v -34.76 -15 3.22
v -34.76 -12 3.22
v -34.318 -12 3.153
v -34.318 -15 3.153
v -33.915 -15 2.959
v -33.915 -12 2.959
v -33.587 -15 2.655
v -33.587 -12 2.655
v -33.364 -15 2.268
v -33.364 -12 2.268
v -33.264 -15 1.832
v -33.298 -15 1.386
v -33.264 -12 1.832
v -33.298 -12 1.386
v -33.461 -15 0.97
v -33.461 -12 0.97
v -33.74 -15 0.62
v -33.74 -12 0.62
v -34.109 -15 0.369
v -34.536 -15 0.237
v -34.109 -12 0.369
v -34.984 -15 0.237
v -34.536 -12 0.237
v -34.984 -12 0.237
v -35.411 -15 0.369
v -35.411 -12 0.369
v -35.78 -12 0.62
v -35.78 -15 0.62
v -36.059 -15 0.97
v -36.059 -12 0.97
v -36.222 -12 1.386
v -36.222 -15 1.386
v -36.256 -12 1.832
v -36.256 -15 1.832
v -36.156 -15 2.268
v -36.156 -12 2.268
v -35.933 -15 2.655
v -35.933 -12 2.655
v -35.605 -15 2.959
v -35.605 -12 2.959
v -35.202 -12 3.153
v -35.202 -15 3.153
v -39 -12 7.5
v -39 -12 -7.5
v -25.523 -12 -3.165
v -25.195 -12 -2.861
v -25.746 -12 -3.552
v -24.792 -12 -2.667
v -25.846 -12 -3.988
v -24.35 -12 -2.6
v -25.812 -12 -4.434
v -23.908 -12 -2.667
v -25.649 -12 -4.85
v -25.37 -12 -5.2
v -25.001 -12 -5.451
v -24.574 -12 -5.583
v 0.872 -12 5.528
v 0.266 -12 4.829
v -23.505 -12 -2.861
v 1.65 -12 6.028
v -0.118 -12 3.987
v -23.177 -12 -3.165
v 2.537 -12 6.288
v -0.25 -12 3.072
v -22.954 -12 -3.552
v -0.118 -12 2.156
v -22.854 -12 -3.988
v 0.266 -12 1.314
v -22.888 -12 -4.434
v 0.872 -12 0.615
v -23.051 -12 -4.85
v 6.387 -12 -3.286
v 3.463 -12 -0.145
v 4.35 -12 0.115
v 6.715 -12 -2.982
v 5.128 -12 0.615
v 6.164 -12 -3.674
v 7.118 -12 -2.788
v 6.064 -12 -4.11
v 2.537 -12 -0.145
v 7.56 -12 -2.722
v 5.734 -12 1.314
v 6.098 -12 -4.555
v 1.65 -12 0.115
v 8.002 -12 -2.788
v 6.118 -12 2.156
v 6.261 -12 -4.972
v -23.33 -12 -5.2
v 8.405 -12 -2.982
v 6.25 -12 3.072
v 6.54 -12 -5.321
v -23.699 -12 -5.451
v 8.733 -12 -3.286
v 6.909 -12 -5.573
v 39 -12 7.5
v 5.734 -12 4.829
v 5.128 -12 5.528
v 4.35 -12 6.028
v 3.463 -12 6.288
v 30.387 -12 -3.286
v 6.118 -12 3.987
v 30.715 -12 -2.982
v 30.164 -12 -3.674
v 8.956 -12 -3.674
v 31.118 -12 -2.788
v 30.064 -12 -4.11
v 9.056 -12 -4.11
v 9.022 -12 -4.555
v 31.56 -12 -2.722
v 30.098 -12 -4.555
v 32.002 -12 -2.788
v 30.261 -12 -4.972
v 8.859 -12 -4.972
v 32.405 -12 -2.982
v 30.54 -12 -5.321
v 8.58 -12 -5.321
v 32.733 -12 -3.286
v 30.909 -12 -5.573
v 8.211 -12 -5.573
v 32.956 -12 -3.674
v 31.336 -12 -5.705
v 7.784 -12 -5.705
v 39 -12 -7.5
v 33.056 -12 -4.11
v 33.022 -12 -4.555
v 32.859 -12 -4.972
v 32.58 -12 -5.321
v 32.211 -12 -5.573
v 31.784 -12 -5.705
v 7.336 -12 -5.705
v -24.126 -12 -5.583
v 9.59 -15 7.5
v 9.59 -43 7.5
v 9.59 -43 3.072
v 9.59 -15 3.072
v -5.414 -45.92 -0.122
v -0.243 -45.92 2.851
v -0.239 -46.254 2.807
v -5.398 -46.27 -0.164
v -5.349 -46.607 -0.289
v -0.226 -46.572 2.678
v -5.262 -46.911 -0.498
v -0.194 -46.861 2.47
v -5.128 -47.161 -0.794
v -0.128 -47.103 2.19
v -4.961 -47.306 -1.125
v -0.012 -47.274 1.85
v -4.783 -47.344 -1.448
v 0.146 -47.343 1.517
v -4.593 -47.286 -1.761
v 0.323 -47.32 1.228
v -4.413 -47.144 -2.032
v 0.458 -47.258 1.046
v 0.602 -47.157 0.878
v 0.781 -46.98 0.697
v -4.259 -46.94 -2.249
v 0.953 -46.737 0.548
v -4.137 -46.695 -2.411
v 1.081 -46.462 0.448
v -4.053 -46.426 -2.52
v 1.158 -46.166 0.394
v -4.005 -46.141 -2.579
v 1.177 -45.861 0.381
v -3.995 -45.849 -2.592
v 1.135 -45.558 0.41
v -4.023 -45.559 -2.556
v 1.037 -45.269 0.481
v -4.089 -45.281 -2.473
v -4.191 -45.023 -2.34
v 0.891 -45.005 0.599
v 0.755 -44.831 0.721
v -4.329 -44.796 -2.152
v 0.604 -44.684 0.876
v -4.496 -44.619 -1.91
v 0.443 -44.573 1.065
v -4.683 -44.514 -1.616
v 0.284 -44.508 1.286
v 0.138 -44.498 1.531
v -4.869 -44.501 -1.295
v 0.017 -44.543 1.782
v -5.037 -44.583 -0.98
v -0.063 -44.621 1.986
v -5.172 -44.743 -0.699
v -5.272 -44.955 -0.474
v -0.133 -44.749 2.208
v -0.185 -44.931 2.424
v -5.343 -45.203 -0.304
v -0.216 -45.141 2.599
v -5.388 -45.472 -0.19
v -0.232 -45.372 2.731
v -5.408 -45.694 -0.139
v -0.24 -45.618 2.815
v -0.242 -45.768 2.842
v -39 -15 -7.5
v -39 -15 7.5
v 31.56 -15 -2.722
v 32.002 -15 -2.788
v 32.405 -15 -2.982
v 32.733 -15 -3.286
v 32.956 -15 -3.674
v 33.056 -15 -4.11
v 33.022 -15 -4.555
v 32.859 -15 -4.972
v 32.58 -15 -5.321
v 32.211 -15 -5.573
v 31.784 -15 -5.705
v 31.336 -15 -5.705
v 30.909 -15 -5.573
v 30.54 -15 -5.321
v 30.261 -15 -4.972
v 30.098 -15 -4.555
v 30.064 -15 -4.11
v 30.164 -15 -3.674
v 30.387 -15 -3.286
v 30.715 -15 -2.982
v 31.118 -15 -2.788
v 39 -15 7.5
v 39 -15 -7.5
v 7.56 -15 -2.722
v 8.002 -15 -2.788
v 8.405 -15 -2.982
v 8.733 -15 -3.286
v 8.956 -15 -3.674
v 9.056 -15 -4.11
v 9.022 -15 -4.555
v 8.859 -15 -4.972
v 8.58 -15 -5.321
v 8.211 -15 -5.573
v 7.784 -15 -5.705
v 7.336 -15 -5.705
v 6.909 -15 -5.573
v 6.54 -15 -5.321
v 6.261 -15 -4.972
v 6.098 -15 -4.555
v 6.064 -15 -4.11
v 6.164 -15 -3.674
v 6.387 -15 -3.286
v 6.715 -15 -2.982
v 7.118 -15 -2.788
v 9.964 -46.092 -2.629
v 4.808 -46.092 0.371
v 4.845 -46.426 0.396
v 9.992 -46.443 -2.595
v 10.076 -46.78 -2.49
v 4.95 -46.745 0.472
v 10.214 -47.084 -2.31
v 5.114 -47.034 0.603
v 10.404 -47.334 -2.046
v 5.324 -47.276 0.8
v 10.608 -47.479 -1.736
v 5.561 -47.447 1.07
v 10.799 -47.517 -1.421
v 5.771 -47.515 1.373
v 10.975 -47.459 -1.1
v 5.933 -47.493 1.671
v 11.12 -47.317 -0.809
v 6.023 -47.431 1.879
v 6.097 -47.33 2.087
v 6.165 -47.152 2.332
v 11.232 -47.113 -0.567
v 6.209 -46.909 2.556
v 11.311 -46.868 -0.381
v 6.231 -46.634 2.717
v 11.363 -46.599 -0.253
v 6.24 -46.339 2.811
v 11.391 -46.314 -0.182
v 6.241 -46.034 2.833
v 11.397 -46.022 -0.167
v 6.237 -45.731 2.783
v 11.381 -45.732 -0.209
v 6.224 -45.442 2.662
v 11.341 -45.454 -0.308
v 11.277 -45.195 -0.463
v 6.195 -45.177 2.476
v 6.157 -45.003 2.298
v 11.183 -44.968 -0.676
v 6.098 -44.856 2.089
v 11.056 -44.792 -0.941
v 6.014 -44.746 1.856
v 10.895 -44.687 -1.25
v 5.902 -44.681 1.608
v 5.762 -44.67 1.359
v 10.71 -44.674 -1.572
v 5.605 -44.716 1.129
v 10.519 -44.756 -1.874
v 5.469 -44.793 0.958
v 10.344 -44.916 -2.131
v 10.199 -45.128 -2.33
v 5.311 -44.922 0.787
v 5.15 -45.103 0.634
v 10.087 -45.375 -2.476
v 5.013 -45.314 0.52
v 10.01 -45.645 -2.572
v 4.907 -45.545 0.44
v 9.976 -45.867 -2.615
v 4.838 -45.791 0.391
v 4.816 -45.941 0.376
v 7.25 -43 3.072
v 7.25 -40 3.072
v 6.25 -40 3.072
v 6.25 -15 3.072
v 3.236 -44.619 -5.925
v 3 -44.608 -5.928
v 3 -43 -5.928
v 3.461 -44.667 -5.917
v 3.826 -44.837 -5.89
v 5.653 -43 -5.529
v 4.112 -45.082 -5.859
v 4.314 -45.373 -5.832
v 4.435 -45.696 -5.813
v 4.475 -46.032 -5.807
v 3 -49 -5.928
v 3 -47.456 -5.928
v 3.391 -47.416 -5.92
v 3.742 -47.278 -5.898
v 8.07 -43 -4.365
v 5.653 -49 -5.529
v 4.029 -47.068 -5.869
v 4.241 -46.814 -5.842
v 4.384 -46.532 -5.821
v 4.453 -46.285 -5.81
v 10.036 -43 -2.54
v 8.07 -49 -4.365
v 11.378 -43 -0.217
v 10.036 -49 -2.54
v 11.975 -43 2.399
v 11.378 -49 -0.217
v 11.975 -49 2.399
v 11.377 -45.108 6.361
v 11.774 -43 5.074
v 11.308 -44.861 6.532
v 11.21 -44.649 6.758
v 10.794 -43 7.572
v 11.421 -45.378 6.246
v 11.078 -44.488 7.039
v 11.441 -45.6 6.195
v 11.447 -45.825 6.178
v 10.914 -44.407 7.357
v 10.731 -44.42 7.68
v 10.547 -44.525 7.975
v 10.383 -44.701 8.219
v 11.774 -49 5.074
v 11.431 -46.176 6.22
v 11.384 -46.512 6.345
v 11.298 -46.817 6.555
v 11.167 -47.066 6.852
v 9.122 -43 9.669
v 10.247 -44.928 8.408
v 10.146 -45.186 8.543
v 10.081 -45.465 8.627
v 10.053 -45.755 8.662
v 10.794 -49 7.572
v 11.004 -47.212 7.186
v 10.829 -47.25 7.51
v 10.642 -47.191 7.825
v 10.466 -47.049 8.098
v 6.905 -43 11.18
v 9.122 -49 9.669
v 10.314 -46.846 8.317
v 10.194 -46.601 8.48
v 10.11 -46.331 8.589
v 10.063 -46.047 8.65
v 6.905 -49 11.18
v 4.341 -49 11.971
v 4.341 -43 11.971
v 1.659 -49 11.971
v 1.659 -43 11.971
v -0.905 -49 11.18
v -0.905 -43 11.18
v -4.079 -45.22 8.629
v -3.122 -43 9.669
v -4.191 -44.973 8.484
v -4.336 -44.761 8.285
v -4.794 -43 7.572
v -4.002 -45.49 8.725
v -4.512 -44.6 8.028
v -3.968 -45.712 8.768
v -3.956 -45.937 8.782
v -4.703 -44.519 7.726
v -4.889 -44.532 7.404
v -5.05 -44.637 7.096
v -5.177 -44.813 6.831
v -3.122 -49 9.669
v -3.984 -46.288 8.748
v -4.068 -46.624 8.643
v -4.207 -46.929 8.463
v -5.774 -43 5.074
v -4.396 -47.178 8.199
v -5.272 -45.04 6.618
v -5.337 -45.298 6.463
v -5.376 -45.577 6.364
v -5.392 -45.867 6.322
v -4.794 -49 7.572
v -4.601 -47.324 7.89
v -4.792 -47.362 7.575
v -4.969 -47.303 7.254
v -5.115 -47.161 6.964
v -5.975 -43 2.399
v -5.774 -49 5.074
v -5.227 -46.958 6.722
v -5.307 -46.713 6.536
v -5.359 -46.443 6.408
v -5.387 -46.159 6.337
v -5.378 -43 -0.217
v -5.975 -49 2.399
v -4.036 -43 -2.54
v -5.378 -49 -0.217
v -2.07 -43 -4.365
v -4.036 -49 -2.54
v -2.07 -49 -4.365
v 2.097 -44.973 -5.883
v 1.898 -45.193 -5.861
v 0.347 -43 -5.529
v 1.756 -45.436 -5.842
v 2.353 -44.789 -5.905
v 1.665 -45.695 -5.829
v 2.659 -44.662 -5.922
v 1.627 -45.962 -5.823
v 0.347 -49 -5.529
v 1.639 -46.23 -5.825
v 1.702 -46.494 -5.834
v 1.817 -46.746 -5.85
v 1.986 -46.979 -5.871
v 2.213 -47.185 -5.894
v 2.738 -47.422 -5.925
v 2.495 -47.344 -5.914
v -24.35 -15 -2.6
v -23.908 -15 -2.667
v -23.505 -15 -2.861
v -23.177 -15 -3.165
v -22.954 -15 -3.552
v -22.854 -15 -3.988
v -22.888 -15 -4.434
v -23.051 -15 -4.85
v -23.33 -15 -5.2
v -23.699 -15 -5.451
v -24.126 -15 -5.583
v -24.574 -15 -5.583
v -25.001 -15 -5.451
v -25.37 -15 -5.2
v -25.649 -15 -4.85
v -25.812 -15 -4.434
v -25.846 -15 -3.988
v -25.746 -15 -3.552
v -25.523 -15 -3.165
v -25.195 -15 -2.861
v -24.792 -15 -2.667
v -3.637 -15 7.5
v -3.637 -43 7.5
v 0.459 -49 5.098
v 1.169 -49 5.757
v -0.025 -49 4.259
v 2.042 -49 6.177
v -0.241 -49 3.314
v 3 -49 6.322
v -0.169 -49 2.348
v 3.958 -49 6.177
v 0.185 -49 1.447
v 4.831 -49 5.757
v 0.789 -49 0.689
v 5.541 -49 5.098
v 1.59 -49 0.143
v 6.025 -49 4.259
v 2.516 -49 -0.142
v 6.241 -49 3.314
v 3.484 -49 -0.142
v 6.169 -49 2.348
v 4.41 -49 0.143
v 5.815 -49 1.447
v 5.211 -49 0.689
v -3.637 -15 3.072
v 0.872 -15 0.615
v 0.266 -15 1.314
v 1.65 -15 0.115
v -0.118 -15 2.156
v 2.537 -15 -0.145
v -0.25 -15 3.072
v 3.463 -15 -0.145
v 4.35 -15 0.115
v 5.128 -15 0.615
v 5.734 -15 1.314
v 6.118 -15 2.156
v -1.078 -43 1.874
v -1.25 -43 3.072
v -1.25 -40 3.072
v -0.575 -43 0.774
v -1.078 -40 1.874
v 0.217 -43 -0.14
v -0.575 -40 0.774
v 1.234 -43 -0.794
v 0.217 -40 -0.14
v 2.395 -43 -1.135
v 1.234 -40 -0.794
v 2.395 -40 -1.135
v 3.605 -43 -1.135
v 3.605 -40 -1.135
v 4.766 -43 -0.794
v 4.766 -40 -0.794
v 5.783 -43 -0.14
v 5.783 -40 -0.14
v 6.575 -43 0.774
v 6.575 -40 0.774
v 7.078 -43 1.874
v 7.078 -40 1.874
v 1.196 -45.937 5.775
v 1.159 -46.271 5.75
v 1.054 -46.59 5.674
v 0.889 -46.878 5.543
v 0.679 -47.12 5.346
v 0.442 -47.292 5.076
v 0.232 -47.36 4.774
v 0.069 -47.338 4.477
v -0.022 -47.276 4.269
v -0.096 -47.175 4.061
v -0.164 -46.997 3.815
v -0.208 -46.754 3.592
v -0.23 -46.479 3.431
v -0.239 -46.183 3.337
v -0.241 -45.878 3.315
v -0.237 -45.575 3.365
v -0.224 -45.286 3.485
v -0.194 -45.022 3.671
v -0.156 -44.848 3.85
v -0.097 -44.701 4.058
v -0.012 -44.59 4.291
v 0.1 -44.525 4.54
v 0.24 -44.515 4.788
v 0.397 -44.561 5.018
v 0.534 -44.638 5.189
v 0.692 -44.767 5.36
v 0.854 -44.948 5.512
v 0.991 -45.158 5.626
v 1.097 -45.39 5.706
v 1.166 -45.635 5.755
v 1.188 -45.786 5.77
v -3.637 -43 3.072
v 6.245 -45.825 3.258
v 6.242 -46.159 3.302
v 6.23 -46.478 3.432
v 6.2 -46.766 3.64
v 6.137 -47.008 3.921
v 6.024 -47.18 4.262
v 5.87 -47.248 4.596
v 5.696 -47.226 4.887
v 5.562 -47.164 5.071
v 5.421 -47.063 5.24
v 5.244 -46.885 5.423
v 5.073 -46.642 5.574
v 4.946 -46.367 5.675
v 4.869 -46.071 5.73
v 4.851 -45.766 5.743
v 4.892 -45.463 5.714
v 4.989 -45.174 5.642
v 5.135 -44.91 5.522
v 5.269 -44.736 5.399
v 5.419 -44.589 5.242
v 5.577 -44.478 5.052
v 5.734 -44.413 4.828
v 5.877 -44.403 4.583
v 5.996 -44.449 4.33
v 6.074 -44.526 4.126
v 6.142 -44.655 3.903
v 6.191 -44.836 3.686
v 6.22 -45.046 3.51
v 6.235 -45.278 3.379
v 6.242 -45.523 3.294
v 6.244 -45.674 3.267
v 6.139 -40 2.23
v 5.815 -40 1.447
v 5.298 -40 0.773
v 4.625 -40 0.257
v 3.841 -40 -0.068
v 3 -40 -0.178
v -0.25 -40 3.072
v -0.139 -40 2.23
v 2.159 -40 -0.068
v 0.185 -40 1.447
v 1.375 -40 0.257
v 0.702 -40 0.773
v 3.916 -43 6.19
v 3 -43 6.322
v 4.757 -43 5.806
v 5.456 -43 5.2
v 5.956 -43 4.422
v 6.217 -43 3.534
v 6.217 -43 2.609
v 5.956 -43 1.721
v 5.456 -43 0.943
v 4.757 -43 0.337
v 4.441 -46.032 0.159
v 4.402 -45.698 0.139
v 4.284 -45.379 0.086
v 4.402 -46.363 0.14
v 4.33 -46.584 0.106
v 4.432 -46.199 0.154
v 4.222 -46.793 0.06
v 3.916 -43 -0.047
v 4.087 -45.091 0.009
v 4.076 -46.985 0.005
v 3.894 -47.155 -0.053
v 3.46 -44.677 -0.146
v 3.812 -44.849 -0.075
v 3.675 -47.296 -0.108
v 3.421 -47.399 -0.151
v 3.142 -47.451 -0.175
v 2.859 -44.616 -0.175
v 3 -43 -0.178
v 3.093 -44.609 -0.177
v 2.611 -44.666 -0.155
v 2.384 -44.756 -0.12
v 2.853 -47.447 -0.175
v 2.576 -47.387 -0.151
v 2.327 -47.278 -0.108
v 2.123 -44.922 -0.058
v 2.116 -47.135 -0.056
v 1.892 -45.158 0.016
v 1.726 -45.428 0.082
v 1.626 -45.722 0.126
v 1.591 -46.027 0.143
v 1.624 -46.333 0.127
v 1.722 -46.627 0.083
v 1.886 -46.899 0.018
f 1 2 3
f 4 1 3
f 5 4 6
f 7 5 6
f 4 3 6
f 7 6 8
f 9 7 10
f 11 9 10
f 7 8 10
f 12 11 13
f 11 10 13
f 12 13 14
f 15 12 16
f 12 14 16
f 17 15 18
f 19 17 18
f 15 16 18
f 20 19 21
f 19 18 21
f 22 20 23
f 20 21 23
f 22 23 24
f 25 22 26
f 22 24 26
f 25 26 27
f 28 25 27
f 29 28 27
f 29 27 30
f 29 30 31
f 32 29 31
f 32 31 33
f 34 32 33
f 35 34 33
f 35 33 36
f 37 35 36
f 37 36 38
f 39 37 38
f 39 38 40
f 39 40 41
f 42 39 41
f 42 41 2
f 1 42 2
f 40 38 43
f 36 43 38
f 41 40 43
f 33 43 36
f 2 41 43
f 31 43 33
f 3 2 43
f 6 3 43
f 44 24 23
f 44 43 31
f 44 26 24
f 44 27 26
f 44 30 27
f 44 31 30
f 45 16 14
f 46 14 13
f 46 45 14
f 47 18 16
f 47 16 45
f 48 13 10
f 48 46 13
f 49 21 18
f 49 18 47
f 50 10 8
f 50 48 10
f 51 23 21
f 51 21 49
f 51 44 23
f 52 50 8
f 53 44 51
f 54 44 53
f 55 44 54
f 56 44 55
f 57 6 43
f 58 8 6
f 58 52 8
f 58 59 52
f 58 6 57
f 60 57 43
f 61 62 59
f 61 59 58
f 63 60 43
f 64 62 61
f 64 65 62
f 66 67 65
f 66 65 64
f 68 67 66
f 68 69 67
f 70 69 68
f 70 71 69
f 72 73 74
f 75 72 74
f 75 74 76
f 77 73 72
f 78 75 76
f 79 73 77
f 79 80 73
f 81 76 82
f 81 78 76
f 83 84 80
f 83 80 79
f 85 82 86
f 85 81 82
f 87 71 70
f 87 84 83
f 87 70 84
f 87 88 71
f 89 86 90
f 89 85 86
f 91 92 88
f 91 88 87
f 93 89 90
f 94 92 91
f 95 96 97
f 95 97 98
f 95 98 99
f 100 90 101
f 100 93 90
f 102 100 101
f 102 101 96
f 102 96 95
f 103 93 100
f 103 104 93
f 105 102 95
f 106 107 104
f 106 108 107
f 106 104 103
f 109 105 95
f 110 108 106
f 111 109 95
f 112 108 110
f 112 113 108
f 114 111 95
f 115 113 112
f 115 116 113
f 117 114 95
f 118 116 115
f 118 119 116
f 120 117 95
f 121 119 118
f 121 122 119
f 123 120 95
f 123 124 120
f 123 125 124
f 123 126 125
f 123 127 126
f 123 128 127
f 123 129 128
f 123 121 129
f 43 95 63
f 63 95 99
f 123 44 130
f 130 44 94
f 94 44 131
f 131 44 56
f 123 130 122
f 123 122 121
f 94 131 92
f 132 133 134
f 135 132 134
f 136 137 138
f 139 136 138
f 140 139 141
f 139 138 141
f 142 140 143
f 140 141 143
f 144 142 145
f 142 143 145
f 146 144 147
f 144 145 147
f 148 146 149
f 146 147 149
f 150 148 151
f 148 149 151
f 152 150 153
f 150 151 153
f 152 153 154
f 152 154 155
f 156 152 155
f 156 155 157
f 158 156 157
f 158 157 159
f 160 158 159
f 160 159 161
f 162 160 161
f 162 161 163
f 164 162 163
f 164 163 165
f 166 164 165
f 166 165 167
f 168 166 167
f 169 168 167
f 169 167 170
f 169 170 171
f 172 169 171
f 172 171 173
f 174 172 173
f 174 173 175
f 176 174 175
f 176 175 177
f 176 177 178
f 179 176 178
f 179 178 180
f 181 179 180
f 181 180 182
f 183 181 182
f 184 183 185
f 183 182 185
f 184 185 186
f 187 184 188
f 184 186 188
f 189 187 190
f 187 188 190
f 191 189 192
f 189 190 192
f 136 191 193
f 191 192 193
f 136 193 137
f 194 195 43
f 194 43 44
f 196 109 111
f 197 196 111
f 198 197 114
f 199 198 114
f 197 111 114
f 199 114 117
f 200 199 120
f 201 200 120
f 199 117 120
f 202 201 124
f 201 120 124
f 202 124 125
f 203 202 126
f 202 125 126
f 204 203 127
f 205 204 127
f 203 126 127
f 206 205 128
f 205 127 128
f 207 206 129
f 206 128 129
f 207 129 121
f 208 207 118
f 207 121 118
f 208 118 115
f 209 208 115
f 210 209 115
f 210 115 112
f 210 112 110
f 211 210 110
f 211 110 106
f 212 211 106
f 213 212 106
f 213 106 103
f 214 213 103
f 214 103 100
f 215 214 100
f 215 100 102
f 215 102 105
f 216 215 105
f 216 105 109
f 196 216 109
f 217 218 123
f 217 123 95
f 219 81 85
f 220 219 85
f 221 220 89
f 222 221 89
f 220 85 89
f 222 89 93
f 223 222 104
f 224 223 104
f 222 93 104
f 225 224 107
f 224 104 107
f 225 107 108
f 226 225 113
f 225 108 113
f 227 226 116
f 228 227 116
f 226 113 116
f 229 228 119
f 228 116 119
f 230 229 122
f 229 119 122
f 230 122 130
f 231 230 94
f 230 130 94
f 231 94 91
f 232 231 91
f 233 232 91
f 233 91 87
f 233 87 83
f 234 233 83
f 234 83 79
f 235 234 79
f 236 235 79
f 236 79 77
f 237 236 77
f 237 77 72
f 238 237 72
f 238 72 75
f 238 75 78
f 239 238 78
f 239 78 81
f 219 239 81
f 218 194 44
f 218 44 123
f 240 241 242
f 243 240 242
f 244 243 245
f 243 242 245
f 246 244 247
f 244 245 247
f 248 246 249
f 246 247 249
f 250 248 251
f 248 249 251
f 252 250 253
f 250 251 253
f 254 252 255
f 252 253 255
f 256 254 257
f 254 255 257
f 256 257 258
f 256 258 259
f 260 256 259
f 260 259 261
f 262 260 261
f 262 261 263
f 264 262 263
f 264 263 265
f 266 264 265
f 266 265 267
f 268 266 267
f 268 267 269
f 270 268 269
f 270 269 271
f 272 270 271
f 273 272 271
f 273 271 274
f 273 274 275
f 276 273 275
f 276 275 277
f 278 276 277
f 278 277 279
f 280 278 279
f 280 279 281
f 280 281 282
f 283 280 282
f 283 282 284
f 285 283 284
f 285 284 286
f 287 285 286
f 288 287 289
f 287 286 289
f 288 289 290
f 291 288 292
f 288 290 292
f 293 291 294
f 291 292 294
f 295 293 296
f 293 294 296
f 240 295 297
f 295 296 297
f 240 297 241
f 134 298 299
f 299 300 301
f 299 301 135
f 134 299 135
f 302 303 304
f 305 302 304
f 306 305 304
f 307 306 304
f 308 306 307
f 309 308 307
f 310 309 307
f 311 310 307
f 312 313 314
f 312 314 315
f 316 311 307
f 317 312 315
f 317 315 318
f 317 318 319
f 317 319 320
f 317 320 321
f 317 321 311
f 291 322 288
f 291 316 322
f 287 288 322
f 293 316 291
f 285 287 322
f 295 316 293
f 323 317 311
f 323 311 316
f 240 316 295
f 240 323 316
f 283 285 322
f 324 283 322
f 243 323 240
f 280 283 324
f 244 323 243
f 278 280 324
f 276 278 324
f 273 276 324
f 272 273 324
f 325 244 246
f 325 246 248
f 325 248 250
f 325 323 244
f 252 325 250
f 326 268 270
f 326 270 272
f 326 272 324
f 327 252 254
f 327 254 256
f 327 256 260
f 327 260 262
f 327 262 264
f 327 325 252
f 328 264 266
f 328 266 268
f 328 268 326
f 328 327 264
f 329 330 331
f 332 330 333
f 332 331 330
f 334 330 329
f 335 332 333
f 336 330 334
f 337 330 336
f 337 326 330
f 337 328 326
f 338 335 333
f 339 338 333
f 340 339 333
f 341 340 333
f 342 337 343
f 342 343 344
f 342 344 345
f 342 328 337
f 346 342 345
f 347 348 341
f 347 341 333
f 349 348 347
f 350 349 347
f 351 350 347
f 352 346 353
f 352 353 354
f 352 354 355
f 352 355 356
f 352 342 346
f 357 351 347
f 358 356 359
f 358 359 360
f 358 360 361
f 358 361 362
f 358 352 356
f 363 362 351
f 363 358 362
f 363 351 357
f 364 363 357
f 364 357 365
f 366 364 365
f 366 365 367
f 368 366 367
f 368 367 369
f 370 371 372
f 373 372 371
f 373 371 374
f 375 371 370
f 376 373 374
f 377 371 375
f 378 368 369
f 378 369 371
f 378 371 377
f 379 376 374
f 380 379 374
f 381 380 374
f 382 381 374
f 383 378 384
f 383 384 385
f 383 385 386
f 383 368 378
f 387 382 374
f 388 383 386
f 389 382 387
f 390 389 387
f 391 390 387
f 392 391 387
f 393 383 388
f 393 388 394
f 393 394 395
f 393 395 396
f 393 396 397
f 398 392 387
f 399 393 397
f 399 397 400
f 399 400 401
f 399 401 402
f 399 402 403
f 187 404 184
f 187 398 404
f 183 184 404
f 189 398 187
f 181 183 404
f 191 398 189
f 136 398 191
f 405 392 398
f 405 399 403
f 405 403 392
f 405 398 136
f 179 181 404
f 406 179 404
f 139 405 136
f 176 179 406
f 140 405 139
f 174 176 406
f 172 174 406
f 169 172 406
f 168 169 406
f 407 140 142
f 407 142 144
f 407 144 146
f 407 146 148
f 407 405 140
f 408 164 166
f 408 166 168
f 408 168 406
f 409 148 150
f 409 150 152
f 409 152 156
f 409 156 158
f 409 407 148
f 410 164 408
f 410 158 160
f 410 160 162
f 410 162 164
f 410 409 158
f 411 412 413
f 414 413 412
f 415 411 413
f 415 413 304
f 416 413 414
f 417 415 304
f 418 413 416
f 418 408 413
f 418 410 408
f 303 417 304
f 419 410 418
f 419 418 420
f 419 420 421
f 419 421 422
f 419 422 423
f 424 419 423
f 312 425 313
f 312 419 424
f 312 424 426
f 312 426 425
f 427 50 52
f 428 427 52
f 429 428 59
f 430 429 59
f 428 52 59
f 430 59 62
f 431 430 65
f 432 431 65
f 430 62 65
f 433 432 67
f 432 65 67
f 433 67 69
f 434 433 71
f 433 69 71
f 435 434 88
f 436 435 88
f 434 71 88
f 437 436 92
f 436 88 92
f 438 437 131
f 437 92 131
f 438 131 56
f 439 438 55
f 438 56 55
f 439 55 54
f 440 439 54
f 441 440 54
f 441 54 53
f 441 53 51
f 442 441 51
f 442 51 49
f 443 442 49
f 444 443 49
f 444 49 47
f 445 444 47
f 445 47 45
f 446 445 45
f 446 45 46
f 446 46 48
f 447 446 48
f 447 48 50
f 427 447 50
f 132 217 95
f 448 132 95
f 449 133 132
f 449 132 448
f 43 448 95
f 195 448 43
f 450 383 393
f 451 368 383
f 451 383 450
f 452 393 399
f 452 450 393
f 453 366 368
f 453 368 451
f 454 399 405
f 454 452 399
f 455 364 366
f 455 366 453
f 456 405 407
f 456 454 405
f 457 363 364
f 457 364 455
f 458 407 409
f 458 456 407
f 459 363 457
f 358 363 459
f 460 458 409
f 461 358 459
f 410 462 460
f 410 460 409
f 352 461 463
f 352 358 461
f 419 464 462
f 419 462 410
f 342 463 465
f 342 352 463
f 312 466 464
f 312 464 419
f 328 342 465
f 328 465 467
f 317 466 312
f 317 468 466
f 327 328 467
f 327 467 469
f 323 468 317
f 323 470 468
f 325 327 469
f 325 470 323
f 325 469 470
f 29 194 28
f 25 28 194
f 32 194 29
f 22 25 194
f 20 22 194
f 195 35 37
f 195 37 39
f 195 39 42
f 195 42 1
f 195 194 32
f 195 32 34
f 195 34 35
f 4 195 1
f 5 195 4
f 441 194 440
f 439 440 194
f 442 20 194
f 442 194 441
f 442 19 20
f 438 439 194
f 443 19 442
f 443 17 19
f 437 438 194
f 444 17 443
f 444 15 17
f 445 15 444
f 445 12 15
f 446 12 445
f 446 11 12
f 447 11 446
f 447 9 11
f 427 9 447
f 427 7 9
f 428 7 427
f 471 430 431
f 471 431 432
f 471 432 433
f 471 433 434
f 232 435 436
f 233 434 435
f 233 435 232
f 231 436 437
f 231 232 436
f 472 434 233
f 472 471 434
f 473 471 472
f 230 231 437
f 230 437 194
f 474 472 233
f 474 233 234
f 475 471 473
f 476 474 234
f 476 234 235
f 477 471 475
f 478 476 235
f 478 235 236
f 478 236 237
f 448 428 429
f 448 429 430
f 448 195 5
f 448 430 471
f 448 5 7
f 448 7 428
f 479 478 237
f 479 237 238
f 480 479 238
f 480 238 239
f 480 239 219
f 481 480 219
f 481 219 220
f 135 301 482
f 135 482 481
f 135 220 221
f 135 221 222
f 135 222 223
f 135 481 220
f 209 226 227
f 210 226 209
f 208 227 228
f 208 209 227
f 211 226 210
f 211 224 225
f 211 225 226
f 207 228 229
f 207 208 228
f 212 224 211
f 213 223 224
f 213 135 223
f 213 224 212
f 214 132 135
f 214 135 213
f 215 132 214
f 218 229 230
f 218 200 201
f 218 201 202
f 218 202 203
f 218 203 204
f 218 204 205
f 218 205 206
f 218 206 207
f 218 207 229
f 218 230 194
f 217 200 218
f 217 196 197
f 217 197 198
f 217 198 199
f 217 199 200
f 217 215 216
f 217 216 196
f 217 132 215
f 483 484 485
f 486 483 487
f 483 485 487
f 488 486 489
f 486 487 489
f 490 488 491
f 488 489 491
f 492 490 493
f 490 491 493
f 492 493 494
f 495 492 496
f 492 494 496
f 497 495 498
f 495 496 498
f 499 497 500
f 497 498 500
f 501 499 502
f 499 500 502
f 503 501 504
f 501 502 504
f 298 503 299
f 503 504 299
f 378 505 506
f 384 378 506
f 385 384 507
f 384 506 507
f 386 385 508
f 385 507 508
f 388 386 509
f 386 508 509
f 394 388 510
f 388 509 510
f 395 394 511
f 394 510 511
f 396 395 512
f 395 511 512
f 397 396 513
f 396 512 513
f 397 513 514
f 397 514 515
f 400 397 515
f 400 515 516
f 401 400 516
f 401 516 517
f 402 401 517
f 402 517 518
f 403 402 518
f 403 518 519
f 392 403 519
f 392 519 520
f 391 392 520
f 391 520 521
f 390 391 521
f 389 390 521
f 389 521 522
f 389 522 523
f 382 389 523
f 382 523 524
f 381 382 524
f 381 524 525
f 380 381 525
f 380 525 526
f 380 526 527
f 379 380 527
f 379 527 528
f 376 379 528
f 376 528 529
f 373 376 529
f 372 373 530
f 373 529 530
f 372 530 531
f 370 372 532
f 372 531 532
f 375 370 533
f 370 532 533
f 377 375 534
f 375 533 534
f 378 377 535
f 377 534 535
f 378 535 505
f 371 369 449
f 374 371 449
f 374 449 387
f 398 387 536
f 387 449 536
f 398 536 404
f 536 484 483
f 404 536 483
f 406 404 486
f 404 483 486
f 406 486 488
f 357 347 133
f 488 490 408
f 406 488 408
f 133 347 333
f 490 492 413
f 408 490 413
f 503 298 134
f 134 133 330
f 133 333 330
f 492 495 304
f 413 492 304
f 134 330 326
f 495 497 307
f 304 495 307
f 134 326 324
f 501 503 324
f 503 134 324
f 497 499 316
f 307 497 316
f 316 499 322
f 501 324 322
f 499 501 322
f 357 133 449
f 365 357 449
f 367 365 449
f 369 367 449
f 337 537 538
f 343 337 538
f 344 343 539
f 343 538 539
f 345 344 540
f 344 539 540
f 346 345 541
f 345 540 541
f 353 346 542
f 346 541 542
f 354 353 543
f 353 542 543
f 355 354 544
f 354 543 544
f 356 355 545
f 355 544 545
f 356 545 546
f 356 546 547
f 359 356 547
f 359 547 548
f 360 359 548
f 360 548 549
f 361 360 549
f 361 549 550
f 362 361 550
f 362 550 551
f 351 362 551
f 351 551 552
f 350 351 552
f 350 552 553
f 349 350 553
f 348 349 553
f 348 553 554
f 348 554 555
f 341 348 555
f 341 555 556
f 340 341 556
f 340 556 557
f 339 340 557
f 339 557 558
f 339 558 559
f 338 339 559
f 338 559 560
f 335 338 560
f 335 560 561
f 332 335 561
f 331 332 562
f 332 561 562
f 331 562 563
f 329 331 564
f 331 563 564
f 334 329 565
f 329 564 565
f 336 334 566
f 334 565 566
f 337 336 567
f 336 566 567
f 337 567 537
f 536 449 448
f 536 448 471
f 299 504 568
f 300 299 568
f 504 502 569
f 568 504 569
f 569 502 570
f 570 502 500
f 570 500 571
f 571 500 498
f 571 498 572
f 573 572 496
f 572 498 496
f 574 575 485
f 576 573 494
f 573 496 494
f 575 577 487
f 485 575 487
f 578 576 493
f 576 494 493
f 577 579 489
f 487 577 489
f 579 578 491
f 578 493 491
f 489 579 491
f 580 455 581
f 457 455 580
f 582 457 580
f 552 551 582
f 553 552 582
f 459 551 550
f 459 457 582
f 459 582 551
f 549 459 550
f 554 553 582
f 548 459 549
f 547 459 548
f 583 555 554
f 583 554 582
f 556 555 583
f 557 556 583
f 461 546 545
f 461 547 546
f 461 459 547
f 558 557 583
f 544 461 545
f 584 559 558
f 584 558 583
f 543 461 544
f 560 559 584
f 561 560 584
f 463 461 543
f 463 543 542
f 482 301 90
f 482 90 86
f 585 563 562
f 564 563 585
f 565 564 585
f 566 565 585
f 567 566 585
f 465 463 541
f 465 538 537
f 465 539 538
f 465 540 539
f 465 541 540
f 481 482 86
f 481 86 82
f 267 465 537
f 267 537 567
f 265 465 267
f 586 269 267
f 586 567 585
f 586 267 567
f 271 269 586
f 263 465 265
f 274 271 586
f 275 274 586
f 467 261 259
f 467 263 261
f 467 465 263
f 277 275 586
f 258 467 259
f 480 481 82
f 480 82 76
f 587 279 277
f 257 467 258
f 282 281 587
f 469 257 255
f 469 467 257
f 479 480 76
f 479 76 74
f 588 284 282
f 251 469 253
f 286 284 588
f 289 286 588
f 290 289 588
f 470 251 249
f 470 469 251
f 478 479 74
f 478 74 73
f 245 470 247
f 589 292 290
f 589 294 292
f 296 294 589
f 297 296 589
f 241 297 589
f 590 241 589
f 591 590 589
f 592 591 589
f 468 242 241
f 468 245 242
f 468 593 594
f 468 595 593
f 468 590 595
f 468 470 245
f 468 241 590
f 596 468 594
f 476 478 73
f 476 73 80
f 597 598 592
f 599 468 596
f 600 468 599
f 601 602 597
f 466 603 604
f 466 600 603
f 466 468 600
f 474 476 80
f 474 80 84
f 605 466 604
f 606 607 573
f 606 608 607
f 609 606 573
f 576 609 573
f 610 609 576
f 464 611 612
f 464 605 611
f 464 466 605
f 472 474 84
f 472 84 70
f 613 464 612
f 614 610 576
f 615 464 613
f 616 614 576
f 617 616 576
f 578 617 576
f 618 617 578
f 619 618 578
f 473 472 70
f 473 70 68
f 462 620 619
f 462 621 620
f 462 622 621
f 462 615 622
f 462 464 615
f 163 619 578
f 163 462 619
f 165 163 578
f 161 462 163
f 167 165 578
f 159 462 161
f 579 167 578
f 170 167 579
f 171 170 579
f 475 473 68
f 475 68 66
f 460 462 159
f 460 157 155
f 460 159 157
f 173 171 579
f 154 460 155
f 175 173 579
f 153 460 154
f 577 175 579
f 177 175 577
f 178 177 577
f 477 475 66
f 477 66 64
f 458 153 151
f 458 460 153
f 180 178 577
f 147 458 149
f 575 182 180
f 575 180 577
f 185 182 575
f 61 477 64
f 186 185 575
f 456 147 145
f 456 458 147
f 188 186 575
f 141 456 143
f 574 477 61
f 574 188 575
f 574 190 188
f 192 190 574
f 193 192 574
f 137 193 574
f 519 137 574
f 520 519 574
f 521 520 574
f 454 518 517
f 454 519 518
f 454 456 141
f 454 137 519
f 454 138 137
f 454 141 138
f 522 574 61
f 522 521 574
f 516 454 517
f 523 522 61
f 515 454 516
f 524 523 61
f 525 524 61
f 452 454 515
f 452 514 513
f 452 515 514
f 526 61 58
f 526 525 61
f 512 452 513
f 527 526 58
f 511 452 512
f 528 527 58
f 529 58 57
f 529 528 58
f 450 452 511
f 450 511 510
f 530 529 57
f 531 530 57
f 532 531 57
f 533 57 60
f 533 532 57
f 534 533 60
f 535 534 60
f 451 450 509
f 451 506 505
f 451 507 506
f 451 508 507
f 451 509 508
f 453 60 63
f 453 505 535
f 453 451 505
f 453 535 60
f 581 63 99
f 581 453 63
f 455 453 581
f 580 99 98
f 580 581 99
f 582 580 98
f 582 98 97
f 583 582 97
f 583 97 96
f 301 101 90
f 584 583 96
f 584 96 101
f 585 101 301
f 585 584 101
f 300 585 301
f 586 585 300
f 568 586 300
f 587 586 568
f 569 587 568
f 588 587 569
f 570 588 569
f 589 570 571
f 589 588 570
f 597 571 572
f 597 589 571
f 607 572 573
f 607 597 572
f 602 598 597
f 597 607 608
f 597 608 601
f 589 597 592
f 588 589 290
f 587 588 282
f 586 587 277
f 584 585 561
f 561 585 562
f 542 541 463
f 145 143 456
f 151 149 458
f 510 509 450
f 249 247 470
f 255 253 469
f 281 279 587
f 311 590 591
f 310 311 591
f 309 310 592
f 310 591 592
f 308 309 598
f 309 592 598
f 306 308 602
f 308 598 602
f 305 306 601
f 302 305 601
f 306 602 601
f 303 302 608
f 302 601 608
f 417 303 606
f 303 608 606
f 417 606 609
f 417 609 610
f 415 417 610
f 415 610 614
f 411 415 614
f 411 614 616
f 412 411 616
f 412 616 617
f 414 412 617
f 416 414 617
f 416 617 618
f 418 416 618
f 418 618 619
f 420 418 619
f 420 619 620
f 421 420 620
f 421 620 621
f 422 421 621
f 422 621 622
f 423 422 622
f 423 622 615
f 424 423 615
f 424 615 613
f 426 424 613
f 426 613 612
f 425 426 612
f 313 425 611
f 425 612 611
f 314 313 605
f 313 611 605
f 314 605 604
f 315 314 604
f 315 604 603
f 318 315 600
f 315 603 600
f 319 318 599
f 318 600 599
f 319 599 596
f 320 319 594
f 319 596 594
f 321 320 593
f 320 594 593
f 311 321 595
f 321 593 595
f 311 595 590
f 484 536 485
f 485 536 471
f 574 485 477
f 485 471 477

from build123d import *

# Parameters (mm, degrees)
SKETCH_1_W                = 78
SKETCH_1_H                = 15
EXTRUDE_1_DEPTH           = 3
SKETCH_3_R                = 1.5
CUT_EXTRUDE_1_DEPTH       = 3
SKETCH_4_R                = 6
EXTRUDE_2_DEPTH           = 18
SKETCH_5_R                = 4.5
CUT_EXTRUDE_2_DEPTH       = 21
F_2_0MM_2_D               = 3
F_2_0MM_2_DEPTH           = 4.5
F_2_0MM_2_TIP             = 1.5
F_2_0MM_2_ON_FACE_2_D     = 3
F_2_0MM_2_ON_FACE_2_DEPTH = 4.5
F_2_0MM_2_ON_FACE_2_TIP   = 1.5
SKETCH_10_W               = 6
SKETCH_10_H               = 10
CUT_EXTRUDE_3_DEPTH       = 7
SKETCH_13_W               = 19.835687411
SKETCH_13_H               = 21.610205193
CUT_EXTRUDE_4_DEPTH       = 20
SKETCH_14_W               = 11.523038103
SKETCH_14_H               = 10.49031299
EXTRUDE_3_DEPTH           = 3
SKETCH_18_W               = 78
SKETCH_18_H               = 8
EXTRUDE_4_DEPTH           = 3
SKETCH_19_W               = 36.767904102
SKETCH_19_H               = 2.5
EXTRUDE_5_DEPTH           = 12.5
SKETCH_23_R               = 1.65
CUT_EXTRUDE_6_DEPTH       = 12.5
SKETCH_25_W               = 4.236607592
SKETCH_25_H               = 5.36409187
EXTRUDE_7_DEPTH           = 2.5
SKETCH_26_R               = 1.6
CUT_EXTRUDE_7_DEPTH       = 2.5
SKETCH_27_W               = 21.346012392
SKETCH_27_H               = 6.594354882
EXTRUDE_8_DEPTH           = 2.5
SKETCH_28_W               = 36.767231154
SKETCH_28_H               = 5.91819544
EXTRUDE_9_DEPTH           = 2.5
SKETCH_29_W               = 27.660340415
SKETCH_29_H               = 3.5
CUT_EXTRUDE_9_DEPTH       = 2.5
SKETCH_30_W               = 78
SKETCH_30_H               = 8
CUT_EXTRUDE_10_DEPTH      = 100
SKETCH_31_W               = 60.820132647
SKETCH_31_H               = 3
EXTRUDE_10_DEPTH          = 49
SKETCH_32_W               = 48
SKETCH_32_H               = 3.2
CUT_EXTRUDE_11_DEPTH      = 49
SKETCH_33_W               = 15
SKETCH_33_H               = 49.05968874
CUT_EXTRUDE_12_DEPTH      = 100
SKETCH_34_R               = 4.25
EXTRUDE_11_DEPTH          = 49
SKETCH_35_R               = 6
EXTRUDE_12_DEPTH          = 6
SKETCH_36_W               = 8.5
SKETCH_36_H               = 40
CUT_EXTRUDE_13_DEPTH      = 11
SKETCH_37_R               = 3.25
CUT_EXTRUDE_16_DEPTH      = 100
SKETCH_39_W               = 8.456699936
SKETCH_39_H               = 16
CUT_EXTRUDE_17_DEPTH      = 1.25
F_3_0MM_1_D               = 2.85
F_3_0MM_1_DEPTH           = 4.143773618
F_3_0MM_1_TIP             = 0.856226382
F_3_0MM_2_D               = 2.85
F_3_0MM_2_DEPTH           = 4.143773618
F_3_0MM_2_TIP             = 0.856226382
F_3_0MM_3_D               = 2.85
F_3_0MM_3_DEPTH           = 4.143773618
F_3_0MM_3_TIP             = 0.856226382
SKETCH_46_W               = 13.227107738
SKETCH_46_H               = 4.428434999
EXTRUDE_13_DEPTH          = 46
CUT_EXTRUDE_18_DEPTH      = 55
EXTRUDE_START             = 15
EXTRUDE_14_DEPTH          = 15
SKETCH_50_R               = 1.5
CUT_EXTRUDE_19_DEPTH      = 15
SKETCH_51_R               = 1.5
CUT_EXTRUDE_20_DEPTH      = 15
SKETCH_52_R               = 1.5
CUT_EXTRUDE_21_DEPTH      = 15
SKETCH_53_R               = 1.5
CUT_EXTRUDE_22_DEPTH      = 15
SKETCH_54_W               = 78
SKETCH_54_H               = 15
CUT_EXTRUDE_23_DEPTH      = 15
F_3_0MM_4_D               = 2.85
F_3_0MM_4_DEPTH           = 4.143773618
F_3_0MM_4_TIP             = 0.856226382
F_3_0MM_5_D               = 2.85
F_3_0MM_5_DEPTH           = 4.143773618
F_3_0MM_5_TIP             = 0.856226382
SKETCH_60_R               = 9
EXTRUDE_15_DEPTH          = 6
CUT_EXTRUDE_START         = -6
SKETCH_61_R               = 3.25
CUT_EXTRUDE_24_DEPTH      = 6
F_3_0MM_6_D               = 2.85
F_3_0MM_6_DEPTH           = 9.143773618
F_3_0MM_6_TIP             = 0.856226382
F_3_0MM_7_D               = 2.85
F_3_0MM_7_DEPTH           = 9.143773618
F_3_0MM_7_TIP             = 0.856226382
F_3_0MM_7_ON_FACE_2_D     = 2.85
F_3_0MM_7_ON_FACE_2_DEPTH = 9.143773618
F_3_0MM_7_ON_FACE_2_TIP   = 0.856226382
F_3_0MM_8_D               = 2.85
F_3_0MM_8_DEPTH           = 9.143773618
F_3_0MM_8_TIP             = 0.856226382
F_3_0MM_8_ON_FACE_2_D     = 2.85
F_3_0MM_8_ON_FACE_2_DEPTH = 9.143773618
F_3_0MM_8_ON_FACE_2_TIP   = 0.856226382


with BuildPart() as part:
    # 草图1 → 凸台-拉伸1 (new body)
    with BuildSketch(Plane(origin=(0, 0, 0), x_dir=(1, 0, 0), z_dir=(0, 1, 0))):
        Rectangle(SKETCH_1_W, SKETCH_1_H)
    extrude(amount=EXTRUDE_1_DEPTH)

    # 草图3 → 切除-拉伸1 (cut)
    with BuildSketch(Plane(origin=(0, 3, 0), x_dir=(1, 0, 0), z_dir=(0, 1, 0))):
        with Locations(Location((-34.76, -1.72, 0), (0, 0, 270))):
            Circle(SKETCH_3_R)
        with Locations(Location((-24.35, 4.1, 0), (0, 0, 270))):
            Circle(SKETCH_3_R)
        with Locations(Location((31.56, 4.221692081, 0), (0, 0, 270))):
            Circle(SKETCH_3_R)
        with Locations(Location((7.56, 4.221692081, 0), (0, 0, 270))):
            Circle(SKETCH_3_R)
    extrude(amount=-CUT_EXTRUDE_1_DEPTH, mode=Mode.SUBTRACT)

    # 草图4 → 凸台-拉伸2 (add)
    with BuildSketch(Plane(origin=(0, 3, 0), x_dir=(1, 0, 0), z_dir=(0, 1, 0))):
        with Locations(Location((-3, -1.234165229, 0), (0, 0, 270))):
            Circle(SKETCH_4_R)
    extrude(amount=EXTRUDE_2_DEPTH)

    # 草图5 → 切除-拉伸2 (cut)
    with BuildSketch(Plane(origin=(0, 21, 0), x_dir=(1, 0, 0), z_dir=(0, 1, 0))):
        with Locations(Location((-3, -1.234165229, 0), (0, 0, 270))):
            Circle(SKETCH_5_R)
    extrude(amount=-CUT_EXTRUDE_2_DEPTH, mode=Mode.SUBTRACT)

    # Ø2.0mm 暗销孔2
    with Locations(Plane(origin=(-7.901331048, 17.342107422, 4.694938836), x_dir=(-0.576795601176, 0, -0.816888507977), z_dir=(-0.816888507977, 0, 0.576795601176))):
        with Locations((0, 0)):
            Hole(F_2_0MM_2_D / 2, depth=F_2_0MM_2_DEPTH)
            with Locations((0, 0, -(F_2_0MM_2_DEPTH + F_2_0MM_2_TIP / 2))):  # 90° drill point
                Cone(0, F_2_0MM_2_D / 2, F_2_0MM_2_TIP, mode=Mode.SUBTRACT)

    # Ø2.0mm 暗销孔2 on face 2
    with Locations(Plane(origin=(1.071764877, 17.164817099, 5.641061052), x_dir=(0.734483043181, 0, -0.678627039897), z_dir=(0.678627039897, 0, 0.734483043181))):
        with Locations((0, 0)):
            Hole(F_2_0MM_2_ON_FACE_2_D / 2, depth=F_2_0MM_2_ON_FACE_2_DEPTH)
            with Locations((0, 0, -(F_2_0MM_2_ON_FACE_2_DEPTH + F_2_0MM_2_ON_FACE_2_TIP / 2))):  # 90° drill point
                Cone(0, F_2_0MM_2_ON_FACE_2_D / 2, F_2_0MM_2_ON_FACE_2_TIP, mode=Mode.SUBTRACT)

    # 草图10 → 切除-拉伸3 (cut)
    with BuildSketch(Plane(origin=(0, 0, -7.5), x_dir=(-1, 0, 0), z_dir=(0, 0, -1))):
        with Locations((3, 8)):
            Rectangle(SKETCH_10_W, SKETCH_10_H)
    extrude(amount=-CUT_EXTRUDE_3_DEPTH, mode=Mode.SUBTRACT)

    # 草图13 → 切除-拉伸4 (cut)
    with BuildSketch(Plane(origin=(0, 0, -7.5), x_dir=(-1, 0, 0), z_dir=(0, 0, -1))):
        with Locations((3.314421038, 13.805102597)):
            Rectangle(SKETCH_13_W, SKETCH_13_H)
    extrude(amount=-CUT_EXTRUDE_4_DEPTH, mode=Mode.SUBTRACT)

    # 草图14 → 凸台-拉伸3 (add)
    with BuildSketch(Plane(origin=(0, 3, 0), x_dir=(1, 0, 0), z_dir=(0, 1, 0))):
        with Locations((-2.989467433, -1.263493391)):
            Rectangle(SKETCH_14_W, SKETCH_14_H)
    extrude(amount=-EXTRUDE_3_DEPTH)

    # 草图18 → 凸台-拉伸4 (add)
    with BuildSketch(Plane.XZ):
        with Locations((0, 11.5)):
            Rectangle(SKETCH_18_W, SKETCH_18_H)
    extrude(amount=-EXTRUDE_4_DEPTH)

    # 草图19 → 凸台-拉伸5 (add)
    with BuildSketch(Plane.XZ):
        with Locations((0.839237194, 14.25)):
            Rectangle(SKETCH_19_W, SKETCH_19_H)
    extrude(amount=EXTRUDE_5_DEPTH)

    # 草图23 → 切除-拉伸6 (cut)
    with BuildSketch(Plane(origin=(0, 0, 13), x_dir=(-1, 0, 0), z_dir=(0, 0, -1))):
        with Locations((-8.603189245, -6.05592298)):
            Circle(SKETCH_23_R)
        with Locations((2.596810755, -6.05592298)):
            Circle(SKETCH_23_R)
    extrude(amount=-CUT_EXTRUDE_6_DEPTH, mode=Mode.SUBTRACT)

    # 草图25 → 凸台-拉伸7 (add)
    with BuildSketch(Plane(origin=(0, 0, 13), x_dir=(-1, 0, 0), z_dir=(0, 0, -1))):
        with Locations((2.330668631, -6.426480946)):
            Rectangle(SKETCH_25_W, SKETCH_25_H)
    extrude(amount=-EXTRUDE_7_DEPTH)

    # 草图26 → 切除-拉伸7 (cut)
    with BuildSketch(Plane(origin=(0, 0, 13), x_dir=(-1, 0, 0), z_dir=(0, 0, -1))):
        with Locations((4.196810755, -6.05592298)):
            Circle(SKETCH_26_R)
    extrude(amount=-CUT_EXTRUDE_7_DEPTH, mode=Mode.SUBTRACT)

    # 草图27 → 凸台-拉伸8 (add)
    with BuildSketch(Plane(origin=(0, 0, 13), x_dir=(-1, 0, 0), z_dir=(0, 0, -1))):
        with Locations((-2.379316694, -6.691741876)):
            Rectangle(SKETCH_27_W, SKETCH_27_H)
    extrude(amount=-EXTRUDE_8_DEPTH)

    # 草图28 → 凸台-拉伸9 (add)
    with BuildSketch(Plane(origin=(0, 0, 13), x_dir=(-1, 0, 0), z_dir=(0, 0, -1))):
        with Locations((-0.839573668, -15.45909772)):
            Rectangle(SKETCH_28_W, SKETCH_28_H)
    extrude(amount=-EXTRUDE_9_DEPTH)

    # 草图29 → 切除-拉伸9 (cut)
    with BuildSketch(Plane(origin=(0, 0, 13), x_dir=(-1, 0, 0), z_dir=(0, 0, -1))):
        with Locations((-0.633763758, -13.394190827)):
            Rectangle(SKETCH_29_W, SKETCH_29_H)
    extrude(amount=-CUT_EXTRUDE_9_DEPTH, mode=Mode.SUBTRACT)

    # 草图30 → 切除-拉伸10 (cut)
    with BuildSketch(Plane(origin=(0, 3, 0), x_dir=(1, 0, 0), z_dir=(0, 1, 0))):
        with Locations((0, -11.5)):
            Rectangle(SKETCH_30_W, SKETCH_30_H)
    extrude(amount=-CUT_EXTRUDE_10_DEPTH, mode=Mode.SUBTRACT)

    # 草图31 → 凸台-拉伸10 (add)
    with BuildSketch(Plane.XZ):
        with Locations((0.65611444, 6)):
            Rectangle(SKETCH_31_W, SKETCH_31_H)
    extrude(amount=EXTRUDE_10_DEPTH)

    # 草图32 → 切除-拉伸11 (cut)
    with BuildSketch(Plane(origin=(0, 0, 4.5), x_dir=(-1, 0, 0), z_dir=(0, 0, -1))):
        with Locations((-0.175604554, -15.854114518)):
            Rectangle(SKETCH_32_W, SKETCH_32_H)
        with Locations((-0.205191163, -23.054114518)):
            Rectangle(SKETCH_32_W, SKETCH_32_H)
        with Locations((-0.173277927, -30.254114518)):
            Rectangle(SKETCH_32_W, SKETCH_32_H)
        with Locations((-0.15338956, -37.454114518)):
            Rectangle(SKETCH_32_W, SKETCH_32_H)
        with Locations((-0.189333293, -44.654114518)):
            Rectangle(SKETCH_32_W, SKETCH_32_H)
        with Locations((-0.276259634, -9.654114518)):
            Rectangle(SKETCH_32_W, SKETCH_32_H)
    extrude(amount=-CUT_EXTRUDE_11_DEPTH, mode=Mode.SUBTRACT)

    # 草图33 → 切除-拉伸12 (cut)
    with BuildSketch(Plane(origin=(31.066180764, 0, 0), x_dir=(0, 0, -1), z_dir=(1, 0, 0))):
        with Locations((0, -24.52984437)):
            Rectangle(SKETCH_33_W, SKETCH_33_H)
    extrude(amount=-CUT_EXTRUDE_12_DEPTH, mode=Mode.SUBTRACT)

    # 草图34 → 凸台-拉伸11 (add)
    with BuildSketch(Plane.XZ):
        with Locations(Location((3, 3.071565001, 0), (0, 0, 90))):
            Circle(SKETCH_34_R)
    extrude(amount=EXTRUDE_11_DEPTH)

    # 草图35 → 凸台-拉伸12 (add)
    with BuildSketch(Plane.XZ.offset(49)):
        with Locations(Location((3, 3.071565001, 0), (0, 0, 270))):
            Circle(SKETCH_35_R)
    extrude(amount=-EXTRUDE_12_DEPTH)

    # 草图36 → 切除-拉伸13 (cut)
    with BuildSketch(Plane(origin=(0, 0, -7.5), x_dir=(-1, 0, 0), z_dir=(0, 0, -1))):
        with Locations((-3, -20)):
            Rectangle(SKETCH_36_W, SKETCH_36_H)
    extrude(amount=-CUT_EXTRUDE_13_DEPTH, mode=Mode.SUBTRACT)

    # 草图37 → 切除-拉伸16 (cut)
    with BuildSketch(Plane.XZ.offset(49)):
        with Locations(Location((3, 3.071565001, 0), (0, 0, 270))):
            Circle(SKETCH_37_R)
    extrude(amount=-CUT_EXTRUDE_16_DEPTH, mode=Mode.SUBTRACT)

    # 草图39 → 切除-拉伸17 (cut)
    with BuildSketch(Plane(origin=(0, 0, 3.5), x_dir=(-1, 0, 0), z_dir=(0, 0, -1))):
        with Locations((-3, -32)):
            Rectangle(SKETCH_39_W, SKETCH_39_H)
    extrude(amount=-CUT_EXTRUDE_17_DEPTH, mode=Mode.SUBTRACT)

    # Ø3.0mm 暗销孔1
    with Locations(Plane(origin=(3.06916604, -45.926554475, -2.928036324), x_dir=(-0.999933554166, 0, -0.011527673319), z_dir=(0.011527673319, 0, -0.999933554166))):
        with Locations((0, 0)):
            Hole(F_3_0MM_1_D / 2, depth=F_3_0MM_1_DEPTH)
            with Locations((0, 0, -(F_3_0MM_1_DEPTH + F_3_0MM_1_TIP / 2))):  # 118° drill point
                Cone(0, F_3_0MM_1_D / 2, F_3_0MM_1_TIP, mode=Mode.SUBTRACT)

    # Ø3.0mm 暗销孔2
    with Locations(Plane(origin=(-2.19436254, -45.980907568, 6.074663036), x_dir=(-0.500516339146, 0, -0.865727089936), z_dir=(-0.865727089936, 0, 0.500516339146))):
        with Locations((0, 0)):
            Hole(F_3_0MM_2_D / 2, depth=F_3_0MM_2_DEPTH)
            with Locations((0, 0, -(F_3_0MM_2_DEPTH + F_3_0MM_2_TIP / 2))):  # 118° drill point
                Cone(0, F_3_0MM_2_D / 2, F_3_0MM_2_TIP, mode=Mode.SUBTRACT)

    # Ø3.0mm 暗销孔3
    with Locations(Plane(origin=(8.205806468, -46.039954185, 6.054781221), x_dir=(-0.497202703373, 0, 0.86763441135), z_dir=(0.86763441135, 0, 0.497202703373))):
        with Locations((0, 0)):
            Hole(F_3_0MM_3_D / 2, depth=F_3_0MM_3_DEPTH)
            with Locations((0, 0, -(F_3_0MM_3_DEPTH + F_3_0MM_3_TIP / 2))):  # 118° drill point
                Cone(0, F_3_0MM_3_D / 2, F_3_0MM_3_TIP, mode=Mode.SUBTRACT)

    # 草图46 → 凸台-拉伸13 (add)
    with BuildSketch(Plane(origin=(0, 3, 0), x_dir=(1, 0, 0), z_dir=(0, 1, 0))):
        with Locations((2.976074231, -5.285782501)):
            Rectangle(SKETCH_46_W, SKETCH_46_H)
    extrude(amount=-EXTRUDE_13_DEPTH)

    # 草图48 → 切除-拉伸18 (cut)
    with BuildSketch(Plane.XZ.offset(49)):
        with BuildLine():
            Line((-0.25, 3.071565001), (6.25, 3.071565001))
            ThreePointArc((6.25, 3.071565001), (3, 6.321565001), (-0.25, 3.071565001))
        make_face()
    extrude(amount=-CUT_EXTRUDE_18_DEPTH, mode=Mode.SUBTRACT)

    # 草图49 → 凸台-拉伸14 (add)
    with BuildSketch(Plane.XZ.offset(EXTRUDE_START)):
        with BuildLine():
            Line((-0.25, 3.071565001), (-3.637479638, 3.071565001))
            Line((-3.637479638, 3.071565001), (-3.637479638, 7.5))
            Line((-3.637479638, 7.5), (-39, 7.5))
            Line((-39, 7.5), (-39, -7.5))
            Line((-39, -7.5), (39, -7.5))
            Line((39, -7.5), (39, 7.5))
            Line((39, 7.5), (9.5896281, 7.5))
            Line((9.5896281, 7.5), (9.5896281, 3.071565001))
            Line((9.5896281, 3.071565001), (6.25, 3.071565001))
            ThreePointArc((6.25, 3.071565001), (3, -0.178434999), (-0.25, 3.071565001))
        make_face()
    extrude(amount=-EXTRUDE_14_DEPTH)

    # 草图50 → 切除-拉伸19 (cut)
    with BuildSketch(Plane(origin=(0, 0, 0), x_dir=(1, 0, 0), z_dir=(0, 1, 0))):
        with Locations(Location((-34.76, -1.72, 0), (0, 0, 270))):
            Circle(SKETCH_50_R)
    extrude(amount=-CUT_EXTRUDE_19_DEPTH, mode=Mode.SUBTRACT)

    # 草图51 → 切除-拉伸20 (cut)
    with BuildSketch(Plane(origin=(0, 0, 0), x_dir=(1, 0, 0), z_dir=(0, 1, 0))):
        with Locations(Location((-24.35, 4.1, 0), (0, 0, 270))):
            Circle(SKETCH_51_R)
    extrude(amount=-CUT_EXTRUDE_20_DEPTH, mode=Mode.SUBTRACT)

    # 草图52 → 切除-拉伸21 (cut)
    with BuildSketch(Plane(origin=(0, 0, 0), x_dir=(1, 0, 0), z_dir=(0, 1, 0))):
        with Locations(Location((7.56, 4.221692081, 0), (0, 0, 270))):
            Circle(SKETCH_52_R)
    extrude(amount=-CUT_EXTRUDE_21_DEPTH, mode=Mode.SUBTRACT)

    # 草图53 → 切除-拉伸22 (cut)
    with BuildSketch(Plane(origin=(0, 0, 0), x_dir=(1, 0, 0), z_dir=(0, 1, 0))):
        with Locations(Location((31.56, 4.221692081, 0), (0, 0, 270))):
            Circle(SKETCH_53_R)
    extrude(amount=-CUT_EXTRUDE_22_DEPTH, mode=Mode.SUBTRACT)

    # 草图54 → 切除-拉伸23 (cut)
    with BuildSketch(Plane(origin=(0, 3, 0), x_dir=(1, 0, 0), z_dir=(0, 1, 0))):
        Rectangle(SKETCH_54_W, SKETCH_54_H)
    extrude(amount=-CUT_EXTRUDE_23_DEPTH, mode=Mode.SUBTRACT)

    # Ø3.0mm 暗销孔4
    with Locations(Plane(origin=(-2.206820669, -45.974417651, 0.09011929), x_dir=(0.496907618427, 0, -0.867803444767), z_dir=(-0.867803444767, 0, -0.496907618427))):
        with Locations((0, 0)):
            Hole(F_3_0MM_4_D / 2, depth=F_3_0MM_4_DEPTH)
            with Locations((0, 0, -(F_3_0MM_4_DEPTH + F_3_0MM_4_TIP / 2))):  # 118° drill point
                Cone(0, F_3_0MM_4_D / 2, F_3_0MM_4_TIP, mode=Mode.SUBTRACT)

    # Ø3.0mm 暗销孔5
    with Locations(Plane(origin=(8.192046128, -46.012961975, 0.064463904), x_dir=(0.501183516141, 0, 0.865341021303), z_dir=(0.865341021303, 0, -0.501183516141))):
        with Locations((0, 0)):
            Hole(F_3_0MM_5_D / 2, depth=F_3_0MM_5_DEPTH)
            with Locations((0, 0, -(F_3_0MM_5_DEPTH + F_3_0MM_5_TIP / 2))):  # 118° drill point
                Cone(0, F_3_0MM_5_D / 2, F_3_0MM_5_TIP, mode=Mode.SUBTRACT)

    # 草图60 → 凸台-拉伸15 (add)
    with BuildSketch(Plane.XZ.offset(49)):
        with Locations(Location((3, 3.071565001, 0), (0, 0, 270))):
            Circle(SKETCH_60_R)
    extrude(amount=-EXTRUDE_15_DEPTH)

    # 草图61 → 切除-拉伸24 (cut)
    with BuildSketch(Plane(origin=(0, -43, 0), x_dir=(1, 0, 0), z_dir=(0, 1, 0)).offset(CUT_EXTRUDE_START)):
        with Locations(Location((3, -3.071565001, 0), (0, 0, 270))):
            Circle(SKETCH_61_R)
    extrude(amount=CUT_EXTRUDE_24_DEPTH, mode=Mode.SUBTRACT)

    # Ø3.0mm 暗销孔6
    with Locations(Plane(origin=(3.050736778, -46.031856967, -5.928291986), x_dir=(-0.999984109623, 0, -0.00563741982), z_dir=(0.00563741982, 0, -0.999984109623))):
        with Locations((0, 0)):
            Hole(F_3_0MM_6_D / 2, depth=F_3_0MM_6_DEPTH)
            with Locations((0, 0, -(F_3_0MM_6_DEPTH + F_3_0MM_6_TIP / 2))):  # 118° drill point
                Cone(0, F_3_0MM_6_D / 2, F_3_0MM_6_TIP, mode=Mode.SUBTRACT)

    # Ø3.0mm 暗销孔7
    with Locations(Plane(origin=(10.848450321, -45.825193133, 7.476315567), x_dir=(-0.489416729598, 0, 0.872050035715), z_dir=(0.872050035715, 0, 0.489416729598))):
        with Locations((0, 0)):
            Hole(F_3_0MM_7_D / 2, depth=F_3_0MM_7_DEPTH)
            with Locations((0, 0, -(F_3_0MM_7_DEPTH + F_3_0MM_7_TIP / 2))):  # 118° drill point
                Cone(0, F_3_0MM_7_D / 2, F_3_0MM_7_TIP, mode=Mode.SUBTRACT)

    # Ø3.0mm 暗销孔7 on face 2
    with Locations(Plane(origin=(-4.772770579, -45.937170264, 7.608528471), x_dir=(-0.504107089648, 0, -0.863641153586), z_dir=(-0.863641153586, 0, 0.504107089648))):
        with Locations((0, 0)):
            Hole(F_3_0MM_7_ON_FACE_2_D / 2, depth=F_3_0MM_7_ON_FACE_2_DEPTH)
            with Locations((0, 0, -(F_3_0MM_7_ON_FACE_2_DEPTH + F_3_0MM_7_ON_FACE_2_TIP / 2))):  # 118° drill point
                Cone(0, F_3_0MM_7_ON_FACE_2_D / 2, F_3_0MM_7_ON_FACE_2_TIP, mode=Mode.SUBTRACT)

    # Ø3.0mm 暗销孔8
    with Locations(Plane(origin=(-4.802469017, -45.919748804, -1.414131961), x_dir=(0.498410773573, 0, -0.866941001906), z_dir=(-0.866941001906, 0, -0.498410773573))):
        with Locations((0, 0)):
            Hole(F_3_0MM_8_D / 2, depth=F_3_0MM_8_DEPTH)
            with Locations((0, 0, -(F_3_0MM_8_DEPTH + F_3_0MM_8_TIP / 2))):  # 118° drill point
                Cone(0, F_3_0MM_8_D / 2, F_3_0MM_8_TIP, mode=Mode.SUBTRACT)

    # Ø3.0mm 暗销孔8 on face 2
    with Locations(Plane(origin=(10.779191078, -46.092465244, -1.454380886), x_dir=(0.502882779306, 0, 0.864354620672), z_dir=(0.864354620672, 0, -0.502882779306))):
        with Locations((1e-09, 0)):
            Hole(F_3_0MM_8_ON_FACE_2_D / 2, depth=F_3_0MM_8_ON_FACE_2_DEPTH)
            with Locations((0, 0, -(F_3_0MM_8_ON_FACE_2_DEPTH + F_3_0MM_8_ON_FACE_2_TIP / 2))):  # 118° drill point
                Cone(0, F_3_0MM_8_ON_FACE_2_D / 2, F_3_0MM_8_ON_FACE_2_TIP, mode=Mode.SUBTRACT)


solid = part.part
